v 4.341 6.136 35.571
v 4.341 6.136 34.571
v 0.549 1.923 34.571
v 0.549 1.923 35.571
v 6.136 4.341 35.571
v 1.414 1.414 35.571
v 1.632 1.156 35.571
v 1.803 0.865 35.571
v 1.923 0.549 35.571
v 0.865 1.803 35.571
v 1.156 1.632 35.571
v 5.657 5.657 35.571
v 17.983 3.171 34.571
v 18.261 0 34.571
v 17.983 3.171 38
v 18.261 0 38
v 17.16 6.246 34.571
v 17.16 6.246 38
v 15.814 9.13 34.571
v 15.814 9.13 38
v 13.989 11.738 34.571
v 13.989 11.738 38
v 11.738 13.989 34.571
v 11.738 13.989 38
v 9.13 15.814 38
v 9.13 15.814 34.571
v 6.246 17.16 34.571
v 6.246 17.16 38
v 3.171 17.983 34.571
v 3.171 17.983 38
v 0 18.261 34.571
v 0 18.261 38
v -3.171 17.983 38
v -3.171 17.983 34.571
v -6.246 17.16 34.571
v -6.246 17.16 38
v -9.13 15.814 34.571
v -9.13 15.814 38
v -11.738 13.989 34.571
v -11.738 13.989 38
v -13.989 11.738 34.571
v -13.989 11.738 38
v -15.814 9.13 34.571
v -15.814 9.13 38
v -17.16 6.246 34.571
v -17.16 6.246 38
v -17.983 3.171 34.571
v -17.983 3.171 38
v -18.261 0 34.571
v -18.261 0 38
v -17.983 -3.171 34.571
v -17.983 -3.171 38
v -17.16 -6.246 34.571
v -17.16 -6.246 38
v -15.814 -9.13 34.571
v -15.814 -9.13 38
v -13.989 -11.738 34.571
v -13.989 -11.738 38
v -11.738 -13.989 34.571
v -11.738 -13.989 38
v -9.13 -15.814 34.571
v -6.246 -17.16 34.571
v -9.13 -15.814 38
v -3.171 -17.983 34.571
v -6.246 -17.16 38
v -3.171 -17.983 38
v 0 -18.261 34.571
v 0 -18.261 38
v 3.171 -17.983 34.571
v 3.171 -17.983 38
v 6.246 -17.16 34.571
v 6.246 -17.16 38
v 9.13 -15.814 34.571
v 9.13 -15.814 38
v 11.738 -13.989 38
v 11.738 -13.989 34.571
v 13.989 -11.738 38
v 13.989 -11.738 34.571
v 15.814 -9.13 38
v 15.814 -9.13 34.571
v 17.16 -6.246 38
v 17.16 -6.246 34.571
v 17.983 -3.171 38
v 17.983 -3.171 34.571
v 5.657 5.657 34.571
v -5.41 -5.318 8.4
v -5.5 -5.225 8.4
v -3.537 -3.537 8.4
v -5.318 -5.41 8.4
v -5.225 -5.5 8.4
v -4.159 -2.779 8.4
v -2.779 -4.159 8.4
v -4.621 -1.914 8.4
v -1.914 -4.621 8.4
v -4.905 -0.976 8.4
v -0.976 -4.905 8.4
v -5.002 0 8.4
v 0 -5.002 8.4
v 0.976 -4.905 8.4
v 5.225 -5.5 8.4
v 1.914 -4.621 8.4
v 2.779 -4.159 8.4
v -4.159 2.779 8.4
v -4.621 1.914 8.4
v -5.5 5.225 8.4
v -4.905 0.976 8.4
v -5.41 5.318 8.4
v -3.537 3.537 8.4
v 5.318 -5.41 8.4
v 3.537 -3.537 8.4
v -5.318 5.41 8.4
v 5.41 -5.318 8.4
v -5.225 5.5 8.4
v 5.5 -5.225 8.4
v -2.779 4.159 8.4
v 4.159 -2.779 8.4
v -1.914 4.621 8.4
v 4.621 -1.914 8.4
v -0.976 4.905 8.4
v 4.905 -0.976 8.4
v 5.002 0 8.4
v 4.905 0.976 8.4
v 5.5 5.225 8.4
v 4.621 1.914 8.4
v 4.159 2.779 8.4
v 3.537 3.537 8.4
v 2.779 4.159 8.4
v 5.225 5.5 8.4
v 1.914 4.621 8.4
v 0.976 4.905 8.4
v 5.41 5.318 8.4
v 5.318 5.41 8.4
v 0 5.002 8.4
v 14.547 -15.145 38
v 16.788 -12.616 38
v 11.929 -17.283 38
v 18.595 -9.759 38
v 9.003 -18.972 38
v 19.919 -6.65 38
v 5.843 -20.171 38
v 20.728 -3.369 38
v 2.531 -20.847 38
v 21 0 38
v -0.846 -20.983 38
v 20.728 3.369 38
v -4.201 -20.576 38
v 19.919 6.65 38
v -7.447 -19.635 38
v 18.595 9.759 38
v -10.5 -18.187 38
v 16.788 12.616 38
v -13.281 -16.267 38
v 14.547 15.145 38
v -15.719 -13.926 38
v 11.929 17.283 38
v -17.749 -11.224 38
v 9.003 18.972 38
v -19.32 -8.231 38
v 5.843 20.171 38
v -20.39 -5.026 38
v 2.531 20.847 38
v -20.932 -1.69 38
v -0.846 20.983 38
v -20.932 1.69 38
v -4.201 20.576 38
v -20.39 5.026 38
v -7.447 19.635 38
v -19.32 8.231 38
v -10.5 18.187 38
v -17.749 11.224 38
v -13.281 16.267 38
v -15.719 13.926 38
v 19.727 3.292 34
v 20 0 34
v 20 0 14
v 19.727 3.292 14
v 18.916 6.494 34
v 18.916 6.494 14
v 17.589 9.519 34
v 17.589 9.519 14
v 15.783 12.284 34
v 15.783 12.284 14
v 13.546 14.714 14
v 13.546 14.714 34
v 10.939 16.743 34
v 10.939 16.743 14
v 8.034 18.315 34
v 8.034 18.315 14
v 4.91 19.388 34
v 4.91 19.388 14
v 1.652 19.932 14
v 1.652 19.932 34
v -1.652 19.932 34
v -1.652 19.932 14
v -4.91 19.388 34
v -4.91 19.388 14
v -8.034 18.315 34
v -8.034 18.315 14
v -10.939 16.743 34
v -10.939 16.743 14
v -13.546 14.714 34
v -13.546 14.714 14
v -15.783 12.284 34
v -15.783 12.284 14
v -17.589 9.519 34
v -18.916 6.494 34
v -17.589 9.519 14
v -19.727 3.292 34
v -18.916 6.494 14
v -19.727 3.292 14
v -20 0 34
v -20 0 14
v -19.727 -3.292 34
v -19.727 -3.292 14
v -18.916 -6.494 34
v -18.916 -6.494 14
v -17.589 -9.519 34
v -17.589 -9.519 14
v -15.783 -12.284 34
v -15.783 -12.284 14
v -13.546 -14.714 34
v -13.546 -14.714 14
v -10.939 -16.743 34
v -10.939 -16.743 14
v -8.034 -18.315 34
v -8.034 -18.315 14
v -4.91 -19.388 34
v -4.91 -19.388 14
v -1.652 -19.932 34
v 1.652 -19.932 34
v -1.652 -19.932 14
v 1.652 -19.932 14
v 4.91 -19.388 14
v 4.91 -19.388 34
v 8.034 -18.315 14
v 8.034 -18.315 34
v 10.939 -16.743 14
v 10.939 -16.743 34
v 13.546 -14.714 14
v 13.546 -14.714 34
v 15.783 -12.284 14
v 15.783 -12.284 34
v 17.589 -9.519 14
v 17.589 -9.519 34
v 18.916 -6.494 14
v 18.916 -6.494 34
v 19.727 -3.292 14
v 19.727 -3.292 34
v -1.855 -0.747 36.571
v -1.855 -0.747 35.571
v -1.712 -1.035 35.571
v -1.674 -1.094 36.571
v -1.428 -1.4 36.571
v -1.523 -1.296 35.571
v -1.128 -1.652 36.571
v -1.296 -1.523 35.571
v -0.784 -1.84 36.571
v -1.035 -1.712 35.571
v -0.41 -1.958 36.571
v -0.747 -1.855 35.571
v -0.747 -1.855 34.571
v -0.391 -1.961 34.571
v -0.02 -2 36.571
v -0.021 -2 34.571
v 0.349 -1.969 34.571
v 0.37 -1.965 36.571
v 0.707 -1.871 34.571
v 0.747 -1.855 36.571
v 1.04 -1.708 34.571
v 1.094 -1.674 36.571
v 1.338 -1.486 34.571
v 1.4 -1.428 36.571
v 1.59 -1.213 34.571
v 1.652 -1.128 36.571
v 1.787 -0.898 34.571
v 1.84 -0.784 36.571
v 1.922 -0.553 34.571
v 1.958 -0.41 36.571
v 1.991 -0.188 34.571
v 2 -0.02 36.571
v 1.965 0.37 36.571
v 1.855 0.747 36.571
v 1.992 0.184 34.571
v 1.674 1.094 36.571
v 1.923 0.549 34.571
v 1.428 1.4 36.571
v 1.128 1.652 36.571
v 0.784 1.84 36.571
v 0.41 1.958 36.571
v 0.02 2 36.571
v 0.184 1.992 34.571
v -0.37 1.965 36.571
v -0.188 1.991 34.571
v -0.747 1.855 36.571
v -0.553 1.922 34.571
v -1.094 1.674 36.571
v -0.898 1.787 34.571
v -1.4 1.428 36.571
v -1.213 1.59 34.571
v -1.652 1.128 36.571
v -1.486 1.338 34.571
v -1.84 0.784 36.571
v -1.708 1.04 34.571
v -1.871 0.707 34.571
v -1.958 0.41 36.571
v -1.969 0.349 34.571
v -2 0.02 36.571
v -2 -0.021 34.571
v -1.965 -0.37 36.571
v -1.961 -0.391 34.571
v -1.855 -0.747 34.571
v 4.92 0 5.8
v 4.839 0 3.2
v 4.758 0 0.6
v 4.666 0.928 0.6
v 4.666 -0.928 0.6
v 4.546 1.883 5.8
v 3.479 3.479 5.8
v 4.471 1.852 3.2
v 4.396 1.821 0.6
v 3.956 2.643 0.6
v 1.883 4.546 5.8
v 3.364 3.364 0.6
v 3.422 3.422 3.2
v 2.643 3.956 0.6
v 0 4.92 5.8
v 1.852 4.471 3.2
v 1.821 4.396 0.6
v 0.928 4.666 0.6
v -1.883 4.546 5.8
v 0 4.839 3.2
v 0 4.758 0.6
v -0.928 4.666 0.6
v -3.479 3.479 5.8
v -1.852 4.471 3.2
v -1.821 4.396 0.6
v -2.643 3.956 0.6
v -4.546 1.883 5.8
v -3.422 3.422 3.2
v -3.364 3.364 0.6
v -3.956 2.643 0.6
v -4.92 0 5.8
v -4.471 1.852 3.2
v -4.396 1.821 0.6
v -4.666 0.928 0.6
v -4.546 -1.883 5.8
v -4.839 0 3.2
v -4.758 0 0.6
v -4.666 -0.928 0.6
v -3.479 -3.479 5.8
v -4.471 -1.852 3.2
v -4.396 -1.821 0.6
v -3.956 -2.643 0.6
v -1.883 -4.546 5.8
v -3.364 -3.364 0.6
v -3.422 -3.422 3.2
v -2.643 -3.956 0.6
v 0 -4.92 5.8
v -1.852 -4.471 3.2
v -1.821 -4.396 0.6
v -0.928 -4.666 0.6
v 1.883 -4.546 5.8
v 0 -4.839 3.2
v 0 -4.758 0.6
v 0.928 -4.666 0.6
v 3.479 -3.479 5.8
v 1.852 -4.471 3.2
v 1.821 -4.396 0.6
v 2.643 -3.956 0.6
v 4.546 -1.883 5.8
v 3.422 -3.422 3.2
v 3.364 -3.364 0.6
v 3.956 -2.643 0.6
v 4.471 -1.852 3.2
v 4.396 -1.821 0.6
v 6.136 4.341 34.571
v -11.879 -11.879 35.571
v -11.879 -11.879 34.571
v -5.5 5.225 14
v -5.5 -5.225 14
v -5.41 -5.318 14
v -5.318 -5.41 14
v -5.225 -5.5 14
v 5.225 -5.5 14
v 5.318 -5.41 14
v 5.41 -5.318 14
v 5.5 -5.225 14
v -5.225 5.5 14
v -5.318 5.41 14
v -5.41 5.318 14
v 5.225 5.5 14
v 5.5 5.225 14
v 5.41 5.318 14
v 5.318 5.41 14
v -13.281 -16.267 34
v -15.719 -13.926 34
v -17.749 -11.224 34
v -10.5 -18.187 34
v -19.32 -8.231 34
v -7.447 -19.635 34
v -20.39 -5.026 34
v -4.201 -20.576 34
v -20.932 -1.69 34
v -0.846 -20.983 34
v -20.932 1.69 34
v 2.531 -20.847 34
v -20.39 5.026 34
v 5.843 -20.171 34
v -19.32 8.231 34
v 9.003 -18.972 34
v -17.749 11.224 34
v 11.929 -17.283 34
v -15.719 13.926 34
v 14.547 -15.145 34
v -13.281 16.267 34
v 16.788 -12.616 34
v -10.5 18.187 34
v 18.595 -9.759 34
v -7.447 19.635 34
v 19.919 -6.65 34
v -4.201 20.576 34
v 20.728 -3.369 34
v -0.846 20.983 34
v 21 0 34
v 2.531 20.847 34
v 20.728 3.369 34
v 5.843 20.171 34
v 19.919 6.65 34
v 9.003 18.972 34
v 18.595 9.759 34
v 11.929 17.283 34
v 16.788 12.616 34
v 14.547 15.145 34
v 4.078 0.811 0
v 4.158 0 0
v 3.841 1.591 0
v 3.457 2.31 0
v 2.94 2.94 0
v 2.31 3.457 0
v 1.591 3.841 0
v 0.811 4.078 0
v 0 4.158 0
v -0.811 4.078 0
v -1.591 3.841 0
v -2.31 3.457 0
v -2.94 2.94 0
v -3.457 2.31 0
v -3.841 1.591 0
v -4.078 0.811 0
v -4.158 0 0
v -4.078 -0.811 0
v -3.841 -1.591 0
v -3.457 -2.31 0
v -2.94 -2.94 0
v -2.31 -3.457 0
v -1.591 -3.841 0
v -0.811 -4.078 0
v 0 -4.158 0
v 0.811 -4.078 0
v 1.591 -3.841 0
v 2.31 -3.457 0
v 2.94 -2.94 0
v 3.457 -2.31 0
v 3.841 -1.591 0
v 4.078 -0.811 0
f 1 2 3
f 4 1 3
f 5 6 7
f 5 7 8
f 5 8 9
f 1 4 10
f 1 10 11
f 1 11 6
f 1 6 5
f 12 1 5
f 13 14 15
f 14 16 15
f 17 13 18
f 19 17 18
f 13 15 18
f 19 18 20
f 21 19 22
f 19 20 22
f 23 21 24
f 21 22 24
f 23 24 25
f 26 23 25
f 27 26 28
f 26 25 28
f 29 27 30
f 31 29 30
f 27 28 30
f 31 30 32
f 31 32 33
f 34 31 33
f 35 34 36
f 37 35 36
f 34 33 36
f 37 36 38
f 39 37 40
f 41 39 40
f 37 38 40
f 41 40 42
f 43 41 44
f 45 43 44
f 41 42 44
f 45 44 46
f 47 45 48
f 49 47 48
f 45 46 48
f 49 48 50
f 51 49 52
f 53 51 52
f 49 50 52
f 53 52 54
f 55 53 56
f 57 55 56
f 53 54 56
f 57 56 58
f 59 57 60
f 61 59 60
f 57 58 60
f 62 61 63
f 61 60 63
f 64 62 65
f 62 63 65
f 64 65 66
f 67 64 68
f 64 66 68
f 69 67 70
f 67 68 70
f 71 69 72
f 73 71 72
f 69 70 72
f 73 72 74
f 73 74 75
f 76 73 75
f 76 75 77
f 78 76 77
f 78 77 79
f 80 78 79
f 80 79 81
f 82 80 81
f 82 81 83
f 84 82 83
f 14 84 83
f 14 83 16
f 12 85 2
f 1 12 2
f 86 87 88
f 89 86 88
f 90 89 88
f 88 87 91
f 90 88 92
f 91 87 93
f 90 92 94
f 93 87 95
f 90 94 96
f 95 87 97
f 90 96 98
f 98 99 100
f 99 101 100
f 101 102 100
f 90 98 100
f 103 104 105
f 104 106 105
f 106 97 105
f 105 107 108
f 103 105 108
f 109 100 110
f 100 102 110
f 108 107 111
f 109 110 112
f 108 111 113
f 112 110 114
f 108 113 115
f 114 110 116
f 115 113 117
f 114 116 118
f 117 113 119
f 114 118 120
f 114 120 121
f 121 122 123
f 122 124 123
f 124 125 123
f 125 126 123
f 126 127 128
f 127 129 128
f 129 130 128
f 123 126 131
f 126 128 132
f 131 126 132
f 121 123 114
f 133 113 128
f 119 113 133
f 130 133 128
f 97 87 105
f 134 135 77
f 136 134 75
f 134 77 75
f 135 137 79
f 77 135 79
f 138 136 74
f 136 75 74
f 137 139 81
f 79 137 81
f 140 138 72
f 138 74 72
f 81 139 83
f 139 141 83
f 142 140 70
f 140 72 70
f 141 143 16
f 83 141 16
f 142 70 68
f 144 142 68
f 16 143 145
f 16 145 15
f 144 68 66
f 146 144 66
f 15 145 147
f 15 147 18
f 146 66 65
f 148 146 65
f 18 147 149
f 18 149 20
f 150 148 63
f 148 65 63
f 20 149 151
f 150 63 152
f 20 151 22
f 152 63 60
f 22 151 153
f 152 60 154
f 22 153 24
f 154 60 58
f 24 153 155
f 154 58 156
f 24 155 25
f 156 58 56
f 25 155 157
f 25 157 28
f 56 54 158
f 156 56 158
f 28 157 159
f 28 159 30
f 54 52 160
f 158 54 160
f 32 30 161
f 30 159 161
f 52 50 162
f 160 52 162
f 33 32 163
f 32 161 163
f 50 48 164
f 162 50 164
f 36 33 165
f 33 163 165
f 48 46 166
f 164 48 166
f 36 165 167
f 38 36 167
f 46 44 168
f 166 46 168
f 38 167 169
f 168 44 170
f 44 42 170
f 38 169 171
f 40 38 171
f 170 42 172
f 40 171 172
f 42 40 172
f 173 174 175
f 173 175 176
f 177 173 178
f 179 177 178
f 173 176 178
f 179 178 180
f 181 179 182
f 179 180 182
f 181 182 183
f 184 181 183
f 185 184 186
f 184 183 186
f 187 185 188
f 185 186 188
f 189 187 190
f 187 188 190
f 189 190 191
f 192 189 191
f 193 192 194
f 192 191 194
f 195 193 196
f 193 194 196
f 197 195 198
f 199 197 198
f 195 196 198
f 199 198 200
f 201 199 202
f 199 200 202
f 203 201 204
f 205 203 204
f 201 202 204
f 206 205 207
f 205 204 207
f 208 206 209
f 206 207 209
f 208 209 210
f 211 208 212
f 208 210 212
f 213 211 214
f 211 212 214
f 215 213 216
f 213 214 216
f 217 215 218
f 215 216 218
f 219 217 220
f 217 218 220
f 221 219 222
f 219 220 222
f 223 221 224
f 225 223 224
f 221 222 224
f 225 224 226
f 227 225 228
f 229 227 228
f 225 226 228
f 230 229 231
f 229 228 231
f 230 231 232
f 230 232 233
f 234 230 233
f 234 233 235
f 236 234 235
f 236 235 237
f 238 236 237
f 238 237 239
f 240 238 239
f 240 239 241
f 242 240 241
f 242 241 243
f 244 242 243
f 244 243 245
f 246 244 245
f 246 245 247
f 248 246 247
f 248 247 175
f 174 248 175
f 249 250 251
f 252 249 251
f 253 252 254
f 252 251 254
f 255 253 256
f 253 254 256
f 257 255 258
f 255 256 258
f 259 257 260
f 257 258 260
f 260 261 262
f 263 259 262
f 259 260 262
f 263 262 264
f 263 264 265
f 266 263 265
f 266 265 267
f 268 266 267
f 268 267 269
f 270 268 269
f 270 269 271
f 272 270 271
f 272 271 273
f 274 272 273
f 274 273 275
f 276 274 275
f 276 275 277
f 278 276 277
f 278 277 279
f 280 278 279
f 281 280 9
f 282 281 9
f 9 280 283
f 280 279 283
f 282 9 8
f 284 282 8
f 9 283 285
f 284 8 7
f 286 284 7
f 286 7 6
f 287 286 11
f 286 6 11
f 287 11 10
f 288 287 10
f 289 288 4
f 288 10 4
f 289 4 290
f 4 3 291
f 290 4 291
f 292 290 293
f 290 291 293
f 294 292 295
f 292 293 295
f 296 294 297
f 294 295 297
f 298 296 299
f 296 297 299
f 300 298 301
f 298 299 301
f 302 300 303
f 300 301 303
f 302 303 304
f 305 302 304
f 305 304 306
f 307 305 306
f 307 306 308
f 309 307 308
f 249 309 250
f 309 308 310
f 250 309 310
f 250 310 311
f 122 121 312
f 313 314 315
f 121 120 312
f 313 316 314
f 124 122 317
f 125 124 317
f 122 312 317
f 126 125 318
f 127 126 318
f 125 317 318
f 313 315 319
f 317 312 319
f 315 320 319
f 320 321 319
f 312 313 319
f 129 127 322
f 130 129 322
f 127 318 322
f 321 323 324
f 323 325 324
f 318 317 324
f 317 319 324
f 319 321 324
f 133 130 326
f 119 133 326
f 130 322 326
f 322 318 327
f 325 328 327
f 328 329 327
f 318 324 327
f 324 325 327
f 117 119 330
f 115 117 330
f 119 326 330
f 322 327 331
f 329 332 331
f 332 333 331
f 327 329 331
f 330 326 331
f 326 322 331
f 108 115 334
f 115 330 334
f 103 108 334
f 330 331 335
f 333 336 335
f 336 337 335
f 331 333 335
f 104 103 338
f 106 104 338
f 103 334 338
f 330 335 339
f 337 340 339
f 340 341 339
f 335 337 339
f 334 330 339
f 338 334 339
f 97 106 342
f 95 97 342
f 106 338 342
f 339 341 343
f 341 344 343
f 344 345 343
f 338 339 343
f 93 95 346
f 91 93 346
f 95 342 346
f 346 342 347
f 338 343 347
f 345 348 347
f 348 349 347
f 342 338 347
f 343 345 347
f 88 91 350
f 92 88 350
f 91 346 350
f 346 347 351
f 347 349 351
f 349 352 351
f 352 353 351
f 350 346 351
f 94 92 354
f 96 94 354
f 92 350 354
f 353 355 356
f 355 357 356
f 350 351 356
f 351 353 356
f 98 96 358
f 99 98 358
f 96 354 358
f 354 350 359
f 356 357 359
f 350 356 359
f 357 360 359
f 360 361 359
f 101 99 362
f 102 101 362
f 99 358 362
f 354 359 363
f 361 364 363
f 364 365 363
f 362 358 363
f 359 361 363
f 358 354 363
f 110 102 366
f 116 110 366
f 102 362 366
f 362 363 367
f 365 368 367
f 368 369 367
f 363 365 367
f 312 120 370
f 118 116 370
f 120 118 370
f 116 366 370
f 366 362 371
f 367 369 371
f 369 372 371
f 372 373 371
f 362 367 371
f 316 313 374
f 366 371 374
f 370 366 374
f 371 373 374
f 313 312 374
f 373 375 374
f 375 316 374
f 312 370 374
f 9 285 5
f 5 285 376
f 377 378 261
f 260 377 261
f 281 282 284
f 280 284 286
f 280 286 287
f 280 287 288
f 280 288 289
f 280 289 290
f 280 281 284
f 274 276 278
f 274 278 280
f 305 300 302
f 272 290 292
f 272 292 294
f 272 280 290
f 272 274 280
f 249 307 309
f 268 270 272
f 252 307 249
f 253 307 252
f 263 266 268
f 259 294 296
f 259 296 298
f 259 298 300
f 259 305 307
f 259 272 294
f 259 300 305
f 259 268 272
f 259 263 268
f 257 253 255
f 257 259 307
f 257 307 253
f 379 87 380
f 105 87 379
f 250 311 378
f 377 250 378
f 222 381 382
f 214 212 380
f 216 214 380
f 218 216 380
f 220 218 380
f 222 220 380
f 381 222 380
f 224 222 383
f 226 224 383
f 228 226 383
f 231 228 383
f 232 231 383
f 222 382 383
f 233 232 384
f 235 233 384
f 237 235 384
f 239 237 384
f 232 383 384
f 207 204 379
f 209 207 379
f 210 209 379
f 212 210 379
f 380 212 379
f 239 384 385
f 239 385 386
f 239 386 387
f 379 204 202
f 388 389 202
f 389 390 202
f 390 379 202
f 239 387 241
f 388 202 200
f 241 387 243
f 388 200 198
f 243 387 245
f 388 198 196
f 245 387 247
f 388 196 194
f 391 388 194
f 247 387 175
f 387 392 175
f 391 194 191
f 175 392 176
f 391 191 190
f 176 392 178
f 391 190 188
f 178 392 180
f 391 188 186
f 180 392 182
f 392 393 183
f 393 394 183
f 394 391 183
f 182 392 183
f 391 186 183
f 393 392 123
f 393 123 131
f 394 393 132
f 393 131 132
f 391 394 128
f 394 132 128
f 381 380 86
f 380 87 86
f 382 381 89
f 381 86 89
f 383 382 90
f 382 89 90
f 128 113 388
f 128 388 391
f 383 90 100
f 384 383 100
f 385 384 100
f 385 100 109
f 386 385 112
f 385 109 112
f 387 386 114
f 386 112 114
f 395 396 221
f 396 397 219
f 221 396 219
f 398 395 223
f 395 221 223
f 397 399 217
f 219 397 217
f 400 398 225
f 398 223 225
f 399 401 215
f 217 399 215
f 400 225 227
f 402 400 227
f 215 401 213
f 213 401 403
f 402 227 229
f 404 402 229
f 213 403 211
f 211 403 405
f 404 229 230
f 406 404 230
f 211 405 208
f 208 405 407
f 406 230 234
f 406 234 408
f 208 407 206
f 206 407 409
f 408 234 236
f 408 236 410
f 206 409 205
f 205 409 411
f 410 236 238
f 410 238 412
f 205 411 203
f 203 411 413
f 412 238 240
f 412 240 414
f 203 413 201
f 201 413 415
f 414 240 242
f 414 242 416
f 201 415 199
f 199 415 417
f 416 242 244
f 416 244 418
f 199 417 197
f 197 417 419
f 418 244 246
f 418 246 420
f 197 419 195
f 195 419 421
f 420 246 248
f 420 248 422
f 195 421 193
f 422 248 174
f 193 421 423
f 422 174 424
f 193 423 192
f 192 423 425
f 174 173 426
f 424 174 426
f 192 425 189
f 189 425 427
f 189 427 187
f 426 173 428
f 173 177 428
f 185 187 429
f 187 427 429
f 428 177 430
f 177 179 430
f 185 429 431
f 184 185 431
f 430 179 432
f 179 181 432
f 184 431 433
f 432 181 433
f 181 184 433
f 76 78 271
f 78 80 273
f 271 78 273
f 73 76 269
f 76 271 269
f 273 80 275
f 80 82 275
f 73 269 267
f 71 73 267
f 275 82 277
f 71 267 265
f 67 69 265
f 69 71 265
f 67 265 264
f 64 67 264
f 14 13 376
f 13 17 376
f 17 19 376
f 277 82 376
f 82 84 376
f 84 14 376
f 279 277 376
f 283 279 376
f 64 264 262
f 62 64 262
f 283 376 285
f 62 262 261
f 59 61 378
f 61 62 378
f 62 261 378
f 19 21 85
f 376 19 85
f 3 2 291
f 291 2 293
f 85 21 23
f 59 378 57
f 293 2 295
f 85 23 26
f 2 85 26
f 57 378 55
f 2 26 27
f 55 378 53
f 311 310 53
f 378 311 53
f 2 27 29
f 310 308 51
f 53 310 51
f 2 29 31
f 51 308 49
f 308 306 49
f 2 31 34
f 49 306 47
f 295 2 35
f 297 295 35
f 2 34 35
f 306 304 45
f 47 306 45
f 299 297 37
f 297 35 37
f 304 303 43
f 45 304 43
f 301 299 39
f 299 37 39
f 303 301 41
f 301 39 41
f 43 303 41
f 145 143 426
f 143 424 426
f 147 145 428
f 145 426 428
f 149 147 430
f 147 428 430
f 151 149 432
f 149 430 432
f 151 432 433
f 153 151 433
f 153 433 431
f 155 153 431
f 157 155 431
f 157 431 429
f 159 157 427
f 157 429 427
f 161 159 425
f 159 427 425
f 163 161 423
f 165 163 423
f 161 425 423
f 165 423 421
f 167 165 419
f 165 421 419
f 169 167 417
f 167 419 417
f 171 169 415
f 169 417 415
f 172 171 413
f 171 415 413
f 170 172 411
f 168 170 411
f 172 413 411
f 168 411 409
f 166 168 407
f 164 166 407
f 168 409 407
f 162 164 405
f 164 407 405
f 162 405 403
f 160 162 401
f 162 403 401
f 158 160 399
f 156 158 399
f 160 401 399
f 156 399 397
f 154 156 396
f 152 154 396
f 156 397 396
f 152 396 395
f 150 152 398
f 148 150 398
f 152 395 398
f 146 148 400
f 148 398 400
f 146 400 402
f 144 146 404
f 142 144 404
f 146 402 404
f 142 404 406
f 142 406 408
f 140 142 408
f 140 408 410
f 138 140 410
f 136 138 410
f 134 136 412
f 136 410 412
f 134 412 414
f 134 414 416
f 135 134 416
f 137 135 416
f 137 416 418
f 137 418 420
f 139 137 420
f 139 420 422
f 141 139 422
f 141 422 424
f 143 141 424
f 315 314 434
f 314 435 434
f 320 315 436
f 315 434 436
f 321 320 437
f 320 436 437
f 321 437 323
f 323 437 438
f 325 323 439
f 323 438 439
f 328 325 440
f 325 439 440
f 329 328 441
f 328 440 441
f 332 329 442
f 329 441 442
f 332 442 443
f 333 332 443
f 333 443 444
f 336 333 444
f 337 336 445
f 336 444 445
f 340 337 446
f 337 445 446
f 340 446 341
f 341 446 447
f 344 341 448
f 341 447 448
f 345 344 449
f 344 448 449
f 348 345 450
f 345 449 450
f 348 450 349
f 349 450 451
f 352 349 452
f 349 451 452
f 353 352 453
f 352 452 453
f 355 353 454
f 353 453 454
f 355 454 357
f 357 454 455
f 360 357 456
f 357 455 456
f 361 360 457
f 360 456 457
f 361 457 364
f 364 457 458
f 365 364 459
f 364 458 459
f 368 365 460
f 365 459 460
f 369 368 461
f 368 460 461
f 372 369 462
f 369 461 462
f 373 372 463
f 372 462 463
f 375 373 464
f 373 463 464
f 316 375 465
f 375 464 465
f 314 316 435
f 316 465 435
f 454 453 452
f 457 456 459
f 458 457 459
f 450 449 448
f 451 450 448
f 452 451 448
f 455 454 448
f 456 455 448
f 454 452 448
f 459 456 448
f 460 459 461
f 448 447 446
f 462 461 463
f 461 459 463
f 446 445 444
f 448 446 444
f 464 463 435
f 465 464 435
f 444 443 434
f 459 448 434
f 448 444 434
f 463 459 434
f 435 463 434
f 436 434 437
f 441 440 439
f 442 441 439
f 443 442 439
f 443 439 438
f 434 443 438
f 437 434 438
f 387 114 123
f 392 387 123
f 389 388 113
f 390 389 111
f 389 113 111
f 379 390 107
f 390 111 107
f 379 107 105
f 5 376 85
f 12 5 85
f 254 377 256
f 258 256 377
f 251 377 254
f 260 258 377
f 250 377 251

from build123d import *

# Parameters (mm, degrees)
EXTRUDE_1_DEPTH     = 1
SKETCH_3_R          = 2
EXTRUDE_2_DEPTH     = 2
SKETCH_4_W          = 36.891891892
SKETCH_4_H          = 44.115479116
SKETCH_4_W_2        = 11
SKETCH_4_H_2        = 11
CUT_EXTRUDE_1_DEPTH = 14


with BuildPart() as part:
    # 草图1 → 旋转1 (revolve)
    with BuildSketch(Plane(origin=(0, 0, 0), x_dir=(0, 0, -1), z_dir=(1, 0, 0))):
        Polygon((-34.571428571, 0), (-34.571428571, 18.260869565), (-38, 18.260869565), (-38, 21), (-34, 21), (-34, 20), (-14, 20), (-14, 7.586206897), (-8.4, 7.586206897), (-8.4, 5.001506871), (-0.600035703, 4.757745806), (0, 4.157710103), (0, 0), align=None)
    revolve(axis=Axis((0, 0, 0), (0, 0, 1)))

    # 草图2 → 凸台-拉伸1 (add)
    with BuildSketch(Plane.XY.offset(34.571428571)):
        Polygon((-11.879393924, -11.879393924), (6.135636089, 4.341411958), (5.656854249, 5.656854249), (4.341411958, 6.135636089), align=None)
    extrude(amount=EXTRUDE_1_DEPTH)

    # 草图3 → 凸台-拉伸2 (add)
    with BuildSketch(Plane.XY.offset(34.571428571)):
        Circle(SKETCH_3_R)
    extrude(amount=EXTRUDE_2_DEPTH)

    # 草图4 → 切除-拉伸1 (cut)
    with BuildSketch(Plane.XY):
        with Locations((-1.160933661, -1.547911548)):
            Rectangle(SKETCH_4_W, SKETCH_4_H)
        Rectangle(SKETCH_4_W_2, SKETCH_4_H_2, mode=Mode.SUBTRACT)
    extrude(amount=CUT_EXTRUDE_1_DEPTH, mode=Mode.SUBTRACT)


solid = part.part
